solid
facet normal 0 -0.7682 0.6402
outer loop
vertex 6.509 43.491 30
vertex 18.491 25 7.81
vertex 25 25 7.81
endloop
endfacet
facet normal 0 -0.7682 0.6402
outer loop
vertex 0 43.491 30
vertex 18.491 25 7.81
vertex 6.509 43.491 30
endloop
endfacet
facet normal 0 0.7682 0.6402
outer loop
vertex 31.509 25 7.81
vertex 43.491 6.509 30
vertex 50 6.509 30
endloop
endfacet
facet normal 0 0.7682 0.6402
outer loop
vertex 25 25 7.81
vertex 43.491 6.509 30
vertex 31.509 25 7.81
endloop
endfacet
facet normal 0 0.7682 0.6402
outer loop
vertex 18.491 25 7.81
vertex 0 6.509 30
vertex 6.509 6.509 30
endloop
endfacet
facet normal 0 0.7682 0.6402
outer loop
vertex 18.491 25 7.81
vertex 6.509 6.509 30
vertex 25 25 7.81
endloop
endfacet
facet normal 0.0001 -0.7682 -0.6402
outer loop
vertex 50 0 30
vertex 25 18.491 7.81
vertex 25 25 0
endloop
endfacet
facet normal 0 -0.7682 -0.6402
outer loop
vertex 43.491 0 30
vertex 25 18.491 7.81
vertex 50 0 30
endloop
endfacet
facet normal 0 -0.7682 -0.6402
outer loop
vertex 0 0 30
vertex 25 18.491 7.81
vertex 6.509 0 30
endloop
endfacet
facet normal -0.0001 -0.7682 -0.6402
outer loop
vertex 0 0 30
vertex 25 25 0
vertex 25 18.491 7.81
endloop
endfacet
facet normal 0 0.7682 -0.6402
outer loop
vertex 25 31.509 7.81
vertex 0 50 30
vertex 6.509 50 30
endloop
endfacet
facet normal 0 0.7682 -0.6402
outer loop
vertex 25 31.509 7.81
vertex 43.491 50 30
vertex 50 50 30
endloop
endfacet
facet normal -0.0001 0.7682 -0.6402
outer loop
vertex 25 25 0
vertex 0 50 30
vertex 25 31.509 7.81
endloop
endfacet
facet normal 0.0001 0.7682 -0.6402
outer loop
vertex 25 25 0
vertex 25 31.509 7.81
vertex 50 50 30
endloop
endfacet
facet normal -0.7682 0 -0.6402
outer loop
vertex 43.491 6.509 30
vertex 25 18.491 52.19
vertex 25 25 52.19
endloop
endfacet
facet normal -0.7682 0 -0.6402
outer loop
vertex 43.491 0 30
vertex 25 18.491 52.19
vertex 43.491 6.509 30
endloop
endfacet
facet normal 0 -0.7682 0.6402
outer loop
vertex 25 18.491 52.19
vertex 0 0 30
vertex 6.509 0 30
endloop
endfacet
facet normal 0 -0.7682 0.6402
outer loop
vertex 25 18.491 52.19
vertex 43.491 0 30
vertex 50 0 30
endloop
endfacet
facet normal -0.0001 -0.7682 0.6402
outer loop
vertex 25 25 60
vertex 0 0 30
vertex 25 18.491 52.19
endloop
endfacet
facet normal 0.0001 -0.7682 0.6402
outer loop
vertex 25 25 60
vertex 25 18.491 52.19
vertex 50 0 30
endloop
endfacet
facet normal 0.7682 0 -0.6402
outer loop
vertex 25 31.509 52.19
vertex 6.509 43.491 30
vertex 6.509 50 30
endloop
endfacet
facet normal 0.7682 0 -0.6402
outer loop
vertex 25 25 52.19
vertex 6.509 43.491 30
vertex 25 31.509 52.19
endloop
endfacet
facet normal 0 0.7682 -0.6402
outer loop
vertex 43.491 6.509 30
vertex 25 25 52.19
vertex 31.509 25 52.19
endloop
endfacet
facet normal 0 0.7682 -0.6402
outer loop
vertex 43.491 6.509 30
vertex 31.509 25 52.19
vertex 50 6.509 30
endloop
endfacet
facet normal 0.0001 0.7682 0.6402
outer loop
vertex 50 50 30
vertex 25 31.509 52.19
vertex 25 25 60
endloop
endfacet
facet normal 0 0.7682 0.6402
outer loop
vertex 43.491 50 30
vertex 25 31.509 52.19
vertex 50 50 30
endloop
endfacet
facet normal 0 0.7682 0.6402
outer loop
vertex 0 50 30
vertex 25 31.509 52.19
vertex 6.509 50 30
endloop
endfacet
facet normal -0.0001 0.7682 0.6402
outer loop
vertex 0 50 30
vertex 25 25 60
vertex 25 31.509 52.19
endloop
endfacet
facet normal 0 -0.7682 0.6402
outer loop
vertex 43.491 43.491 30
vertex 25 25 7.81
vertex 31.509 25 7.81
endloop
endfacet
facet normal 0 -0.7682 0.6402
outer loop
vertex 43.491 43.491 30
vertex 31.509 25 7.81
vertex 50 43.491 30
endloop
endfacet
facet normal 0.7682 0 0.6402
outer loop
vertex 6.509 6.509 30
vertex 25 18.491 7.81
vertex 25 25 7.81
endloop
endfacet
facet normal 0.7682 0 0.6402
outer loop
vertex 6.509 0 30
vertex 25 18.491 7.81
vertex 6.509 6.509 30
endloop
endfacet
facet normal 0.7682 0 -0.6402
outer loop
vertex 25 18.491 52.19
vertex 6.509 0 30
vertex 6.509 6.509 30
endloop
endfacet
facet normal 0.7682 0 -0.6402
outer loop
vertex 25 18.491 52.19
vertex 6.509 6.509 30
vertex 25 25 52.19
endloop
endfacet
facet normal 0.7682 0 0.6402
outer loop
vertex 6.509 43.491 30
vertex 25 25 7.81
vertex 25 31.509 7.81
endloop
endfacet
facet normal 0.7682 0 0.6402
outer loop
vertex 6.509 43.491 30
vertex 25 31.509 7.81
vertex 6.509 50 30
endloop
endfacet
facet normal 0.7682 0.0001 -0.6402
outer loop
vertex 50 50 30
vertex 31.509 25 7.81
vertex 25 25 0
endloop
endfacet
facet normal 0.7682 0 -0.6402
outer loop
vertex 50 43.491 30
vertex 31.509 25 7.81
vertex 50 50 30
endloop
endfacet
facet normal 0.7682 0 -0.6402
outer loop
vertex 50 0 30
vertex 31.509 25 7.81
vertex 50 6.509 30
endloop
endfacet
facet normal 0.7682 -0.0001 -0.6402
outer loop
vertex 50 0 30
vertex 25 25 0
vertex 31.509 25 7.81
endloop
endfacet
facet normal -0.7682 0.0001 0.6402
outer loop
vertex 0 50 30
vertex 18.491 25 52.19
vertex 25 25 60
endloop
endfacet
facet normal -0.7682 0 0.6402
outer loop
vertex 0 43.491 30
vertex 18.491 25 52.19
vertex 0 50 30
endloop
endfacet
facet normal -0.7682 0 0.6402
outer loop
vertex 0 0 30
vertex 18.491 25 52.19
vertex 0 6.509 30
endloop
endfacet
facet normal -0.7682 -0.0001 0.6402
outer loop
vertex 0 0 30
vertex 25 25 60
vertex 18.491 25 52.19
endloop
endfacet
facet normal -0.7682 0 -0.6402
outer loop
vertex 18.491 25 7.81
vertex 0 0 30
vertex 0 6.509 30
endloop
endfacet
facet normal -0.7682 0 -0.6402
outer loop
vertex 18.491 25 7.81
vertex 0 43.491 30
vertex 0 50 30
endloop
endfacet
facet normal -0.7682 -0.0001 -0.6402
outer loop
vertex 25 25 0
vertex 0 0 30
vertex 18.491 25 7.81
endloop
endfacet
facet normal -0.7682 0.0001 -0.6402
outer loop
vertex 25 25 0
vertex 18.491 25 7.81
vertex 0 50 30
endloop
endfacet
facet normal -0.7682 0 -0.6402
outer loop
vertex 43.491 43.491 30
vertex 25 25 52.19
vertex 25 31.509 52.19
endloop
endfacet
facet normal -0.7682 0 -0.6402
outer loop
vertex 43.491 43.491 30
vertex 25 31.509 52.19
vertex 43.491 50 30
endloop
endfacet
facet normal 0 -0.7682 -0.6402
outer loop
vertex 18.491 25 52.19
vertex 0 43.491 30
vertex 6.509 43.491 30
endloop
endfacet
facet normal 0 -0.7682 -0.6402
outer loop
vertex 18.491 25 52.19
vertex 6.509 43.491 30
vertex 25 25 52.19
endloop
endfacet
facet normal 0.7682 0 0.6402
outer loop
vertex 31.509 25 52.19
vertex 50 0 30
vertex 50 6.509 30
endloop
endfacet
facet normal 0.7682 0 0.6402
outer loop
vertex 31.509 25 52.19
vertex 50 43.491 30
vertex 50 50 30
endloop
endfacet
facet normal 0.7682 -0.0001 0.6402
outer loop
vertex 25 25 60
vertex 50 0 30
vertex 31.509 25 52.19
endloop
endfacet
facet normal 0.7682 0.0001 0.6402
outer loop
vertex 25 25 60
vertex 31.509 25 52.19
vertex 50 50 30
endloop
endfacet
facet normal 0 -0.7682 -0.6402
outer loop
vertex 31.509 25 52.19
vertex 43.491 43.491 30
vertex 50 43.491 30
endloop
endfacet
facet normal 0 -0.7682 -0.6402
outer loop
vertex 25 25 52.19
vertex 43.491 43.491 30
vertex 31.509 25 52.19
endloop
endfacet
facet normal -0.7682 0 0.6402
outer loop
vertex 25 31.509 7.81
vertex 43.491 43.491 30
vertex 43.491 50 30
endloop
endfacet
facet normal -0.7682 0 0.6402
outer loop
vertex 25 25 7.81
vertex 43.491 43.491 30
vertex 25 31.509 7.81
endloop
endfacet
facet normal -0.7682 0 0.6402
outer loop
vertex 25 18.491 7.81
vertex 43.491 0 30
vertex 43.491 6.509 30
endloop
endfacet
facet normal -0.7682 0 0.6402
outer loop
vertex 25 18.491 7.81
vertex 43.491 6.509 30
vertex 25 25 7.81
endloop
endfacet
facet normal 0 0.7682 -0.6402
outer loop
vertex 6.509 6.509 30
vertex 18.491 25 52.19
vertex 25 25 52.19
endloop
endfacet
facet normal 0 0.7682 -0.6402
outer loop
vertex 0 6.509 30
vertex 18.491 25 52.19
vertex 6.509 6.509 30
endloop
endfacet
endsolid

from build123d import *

# Parameters (mm, degrees)
F0_W     = 50
F0_H     = 50
F1_DEPTH = 60
F4_DEPTH = 50.001
F5_DEPTH = 50.001


with BuildPart() as f1:
    # F0 (on Top) → F1 (new body)
    with BuildSketch(Plane.XY):
        with Locations((25, 25)):
            Rectangle(F0_W, F0_H)
    extrude(amount=F1_DEPTH)

    # F2 (on face) → F4 (intersect, through all)
    with BuildSketch(Plane.XZ):
        Polygon((50, 30), (25, 60), (0, 30), (25, 0), align=None)
        Polygon((25, 7.81025), (6.508541, 30), (25, 52.18975), (43.491459, 30), align=None, mode=Mode.SUBTRACT)
    extrude(amount=-F4_DEPTH, mode=Mode.INTERSECT)

    # F3 (on face) → F5 (intersect, through all)
    with BuildSketch(Plane(origin=(0, 0, 0), x_dir=(0, -1, 0), z_dir=(-1, 0, 0))):
        Polygon((-50, 30), (-25, 0), (0, 30), (-25, 60), align=None)
        Polygon((-6.508541, 30), (-25, 7.81025), (-43.491459, 30), (-25, 52.18975), align=None, mode=Mode.SUBTRACT)
    extrude(amount=-F5_DEPTH, mode=Mode.INTERSECT)


solid = f1.part
